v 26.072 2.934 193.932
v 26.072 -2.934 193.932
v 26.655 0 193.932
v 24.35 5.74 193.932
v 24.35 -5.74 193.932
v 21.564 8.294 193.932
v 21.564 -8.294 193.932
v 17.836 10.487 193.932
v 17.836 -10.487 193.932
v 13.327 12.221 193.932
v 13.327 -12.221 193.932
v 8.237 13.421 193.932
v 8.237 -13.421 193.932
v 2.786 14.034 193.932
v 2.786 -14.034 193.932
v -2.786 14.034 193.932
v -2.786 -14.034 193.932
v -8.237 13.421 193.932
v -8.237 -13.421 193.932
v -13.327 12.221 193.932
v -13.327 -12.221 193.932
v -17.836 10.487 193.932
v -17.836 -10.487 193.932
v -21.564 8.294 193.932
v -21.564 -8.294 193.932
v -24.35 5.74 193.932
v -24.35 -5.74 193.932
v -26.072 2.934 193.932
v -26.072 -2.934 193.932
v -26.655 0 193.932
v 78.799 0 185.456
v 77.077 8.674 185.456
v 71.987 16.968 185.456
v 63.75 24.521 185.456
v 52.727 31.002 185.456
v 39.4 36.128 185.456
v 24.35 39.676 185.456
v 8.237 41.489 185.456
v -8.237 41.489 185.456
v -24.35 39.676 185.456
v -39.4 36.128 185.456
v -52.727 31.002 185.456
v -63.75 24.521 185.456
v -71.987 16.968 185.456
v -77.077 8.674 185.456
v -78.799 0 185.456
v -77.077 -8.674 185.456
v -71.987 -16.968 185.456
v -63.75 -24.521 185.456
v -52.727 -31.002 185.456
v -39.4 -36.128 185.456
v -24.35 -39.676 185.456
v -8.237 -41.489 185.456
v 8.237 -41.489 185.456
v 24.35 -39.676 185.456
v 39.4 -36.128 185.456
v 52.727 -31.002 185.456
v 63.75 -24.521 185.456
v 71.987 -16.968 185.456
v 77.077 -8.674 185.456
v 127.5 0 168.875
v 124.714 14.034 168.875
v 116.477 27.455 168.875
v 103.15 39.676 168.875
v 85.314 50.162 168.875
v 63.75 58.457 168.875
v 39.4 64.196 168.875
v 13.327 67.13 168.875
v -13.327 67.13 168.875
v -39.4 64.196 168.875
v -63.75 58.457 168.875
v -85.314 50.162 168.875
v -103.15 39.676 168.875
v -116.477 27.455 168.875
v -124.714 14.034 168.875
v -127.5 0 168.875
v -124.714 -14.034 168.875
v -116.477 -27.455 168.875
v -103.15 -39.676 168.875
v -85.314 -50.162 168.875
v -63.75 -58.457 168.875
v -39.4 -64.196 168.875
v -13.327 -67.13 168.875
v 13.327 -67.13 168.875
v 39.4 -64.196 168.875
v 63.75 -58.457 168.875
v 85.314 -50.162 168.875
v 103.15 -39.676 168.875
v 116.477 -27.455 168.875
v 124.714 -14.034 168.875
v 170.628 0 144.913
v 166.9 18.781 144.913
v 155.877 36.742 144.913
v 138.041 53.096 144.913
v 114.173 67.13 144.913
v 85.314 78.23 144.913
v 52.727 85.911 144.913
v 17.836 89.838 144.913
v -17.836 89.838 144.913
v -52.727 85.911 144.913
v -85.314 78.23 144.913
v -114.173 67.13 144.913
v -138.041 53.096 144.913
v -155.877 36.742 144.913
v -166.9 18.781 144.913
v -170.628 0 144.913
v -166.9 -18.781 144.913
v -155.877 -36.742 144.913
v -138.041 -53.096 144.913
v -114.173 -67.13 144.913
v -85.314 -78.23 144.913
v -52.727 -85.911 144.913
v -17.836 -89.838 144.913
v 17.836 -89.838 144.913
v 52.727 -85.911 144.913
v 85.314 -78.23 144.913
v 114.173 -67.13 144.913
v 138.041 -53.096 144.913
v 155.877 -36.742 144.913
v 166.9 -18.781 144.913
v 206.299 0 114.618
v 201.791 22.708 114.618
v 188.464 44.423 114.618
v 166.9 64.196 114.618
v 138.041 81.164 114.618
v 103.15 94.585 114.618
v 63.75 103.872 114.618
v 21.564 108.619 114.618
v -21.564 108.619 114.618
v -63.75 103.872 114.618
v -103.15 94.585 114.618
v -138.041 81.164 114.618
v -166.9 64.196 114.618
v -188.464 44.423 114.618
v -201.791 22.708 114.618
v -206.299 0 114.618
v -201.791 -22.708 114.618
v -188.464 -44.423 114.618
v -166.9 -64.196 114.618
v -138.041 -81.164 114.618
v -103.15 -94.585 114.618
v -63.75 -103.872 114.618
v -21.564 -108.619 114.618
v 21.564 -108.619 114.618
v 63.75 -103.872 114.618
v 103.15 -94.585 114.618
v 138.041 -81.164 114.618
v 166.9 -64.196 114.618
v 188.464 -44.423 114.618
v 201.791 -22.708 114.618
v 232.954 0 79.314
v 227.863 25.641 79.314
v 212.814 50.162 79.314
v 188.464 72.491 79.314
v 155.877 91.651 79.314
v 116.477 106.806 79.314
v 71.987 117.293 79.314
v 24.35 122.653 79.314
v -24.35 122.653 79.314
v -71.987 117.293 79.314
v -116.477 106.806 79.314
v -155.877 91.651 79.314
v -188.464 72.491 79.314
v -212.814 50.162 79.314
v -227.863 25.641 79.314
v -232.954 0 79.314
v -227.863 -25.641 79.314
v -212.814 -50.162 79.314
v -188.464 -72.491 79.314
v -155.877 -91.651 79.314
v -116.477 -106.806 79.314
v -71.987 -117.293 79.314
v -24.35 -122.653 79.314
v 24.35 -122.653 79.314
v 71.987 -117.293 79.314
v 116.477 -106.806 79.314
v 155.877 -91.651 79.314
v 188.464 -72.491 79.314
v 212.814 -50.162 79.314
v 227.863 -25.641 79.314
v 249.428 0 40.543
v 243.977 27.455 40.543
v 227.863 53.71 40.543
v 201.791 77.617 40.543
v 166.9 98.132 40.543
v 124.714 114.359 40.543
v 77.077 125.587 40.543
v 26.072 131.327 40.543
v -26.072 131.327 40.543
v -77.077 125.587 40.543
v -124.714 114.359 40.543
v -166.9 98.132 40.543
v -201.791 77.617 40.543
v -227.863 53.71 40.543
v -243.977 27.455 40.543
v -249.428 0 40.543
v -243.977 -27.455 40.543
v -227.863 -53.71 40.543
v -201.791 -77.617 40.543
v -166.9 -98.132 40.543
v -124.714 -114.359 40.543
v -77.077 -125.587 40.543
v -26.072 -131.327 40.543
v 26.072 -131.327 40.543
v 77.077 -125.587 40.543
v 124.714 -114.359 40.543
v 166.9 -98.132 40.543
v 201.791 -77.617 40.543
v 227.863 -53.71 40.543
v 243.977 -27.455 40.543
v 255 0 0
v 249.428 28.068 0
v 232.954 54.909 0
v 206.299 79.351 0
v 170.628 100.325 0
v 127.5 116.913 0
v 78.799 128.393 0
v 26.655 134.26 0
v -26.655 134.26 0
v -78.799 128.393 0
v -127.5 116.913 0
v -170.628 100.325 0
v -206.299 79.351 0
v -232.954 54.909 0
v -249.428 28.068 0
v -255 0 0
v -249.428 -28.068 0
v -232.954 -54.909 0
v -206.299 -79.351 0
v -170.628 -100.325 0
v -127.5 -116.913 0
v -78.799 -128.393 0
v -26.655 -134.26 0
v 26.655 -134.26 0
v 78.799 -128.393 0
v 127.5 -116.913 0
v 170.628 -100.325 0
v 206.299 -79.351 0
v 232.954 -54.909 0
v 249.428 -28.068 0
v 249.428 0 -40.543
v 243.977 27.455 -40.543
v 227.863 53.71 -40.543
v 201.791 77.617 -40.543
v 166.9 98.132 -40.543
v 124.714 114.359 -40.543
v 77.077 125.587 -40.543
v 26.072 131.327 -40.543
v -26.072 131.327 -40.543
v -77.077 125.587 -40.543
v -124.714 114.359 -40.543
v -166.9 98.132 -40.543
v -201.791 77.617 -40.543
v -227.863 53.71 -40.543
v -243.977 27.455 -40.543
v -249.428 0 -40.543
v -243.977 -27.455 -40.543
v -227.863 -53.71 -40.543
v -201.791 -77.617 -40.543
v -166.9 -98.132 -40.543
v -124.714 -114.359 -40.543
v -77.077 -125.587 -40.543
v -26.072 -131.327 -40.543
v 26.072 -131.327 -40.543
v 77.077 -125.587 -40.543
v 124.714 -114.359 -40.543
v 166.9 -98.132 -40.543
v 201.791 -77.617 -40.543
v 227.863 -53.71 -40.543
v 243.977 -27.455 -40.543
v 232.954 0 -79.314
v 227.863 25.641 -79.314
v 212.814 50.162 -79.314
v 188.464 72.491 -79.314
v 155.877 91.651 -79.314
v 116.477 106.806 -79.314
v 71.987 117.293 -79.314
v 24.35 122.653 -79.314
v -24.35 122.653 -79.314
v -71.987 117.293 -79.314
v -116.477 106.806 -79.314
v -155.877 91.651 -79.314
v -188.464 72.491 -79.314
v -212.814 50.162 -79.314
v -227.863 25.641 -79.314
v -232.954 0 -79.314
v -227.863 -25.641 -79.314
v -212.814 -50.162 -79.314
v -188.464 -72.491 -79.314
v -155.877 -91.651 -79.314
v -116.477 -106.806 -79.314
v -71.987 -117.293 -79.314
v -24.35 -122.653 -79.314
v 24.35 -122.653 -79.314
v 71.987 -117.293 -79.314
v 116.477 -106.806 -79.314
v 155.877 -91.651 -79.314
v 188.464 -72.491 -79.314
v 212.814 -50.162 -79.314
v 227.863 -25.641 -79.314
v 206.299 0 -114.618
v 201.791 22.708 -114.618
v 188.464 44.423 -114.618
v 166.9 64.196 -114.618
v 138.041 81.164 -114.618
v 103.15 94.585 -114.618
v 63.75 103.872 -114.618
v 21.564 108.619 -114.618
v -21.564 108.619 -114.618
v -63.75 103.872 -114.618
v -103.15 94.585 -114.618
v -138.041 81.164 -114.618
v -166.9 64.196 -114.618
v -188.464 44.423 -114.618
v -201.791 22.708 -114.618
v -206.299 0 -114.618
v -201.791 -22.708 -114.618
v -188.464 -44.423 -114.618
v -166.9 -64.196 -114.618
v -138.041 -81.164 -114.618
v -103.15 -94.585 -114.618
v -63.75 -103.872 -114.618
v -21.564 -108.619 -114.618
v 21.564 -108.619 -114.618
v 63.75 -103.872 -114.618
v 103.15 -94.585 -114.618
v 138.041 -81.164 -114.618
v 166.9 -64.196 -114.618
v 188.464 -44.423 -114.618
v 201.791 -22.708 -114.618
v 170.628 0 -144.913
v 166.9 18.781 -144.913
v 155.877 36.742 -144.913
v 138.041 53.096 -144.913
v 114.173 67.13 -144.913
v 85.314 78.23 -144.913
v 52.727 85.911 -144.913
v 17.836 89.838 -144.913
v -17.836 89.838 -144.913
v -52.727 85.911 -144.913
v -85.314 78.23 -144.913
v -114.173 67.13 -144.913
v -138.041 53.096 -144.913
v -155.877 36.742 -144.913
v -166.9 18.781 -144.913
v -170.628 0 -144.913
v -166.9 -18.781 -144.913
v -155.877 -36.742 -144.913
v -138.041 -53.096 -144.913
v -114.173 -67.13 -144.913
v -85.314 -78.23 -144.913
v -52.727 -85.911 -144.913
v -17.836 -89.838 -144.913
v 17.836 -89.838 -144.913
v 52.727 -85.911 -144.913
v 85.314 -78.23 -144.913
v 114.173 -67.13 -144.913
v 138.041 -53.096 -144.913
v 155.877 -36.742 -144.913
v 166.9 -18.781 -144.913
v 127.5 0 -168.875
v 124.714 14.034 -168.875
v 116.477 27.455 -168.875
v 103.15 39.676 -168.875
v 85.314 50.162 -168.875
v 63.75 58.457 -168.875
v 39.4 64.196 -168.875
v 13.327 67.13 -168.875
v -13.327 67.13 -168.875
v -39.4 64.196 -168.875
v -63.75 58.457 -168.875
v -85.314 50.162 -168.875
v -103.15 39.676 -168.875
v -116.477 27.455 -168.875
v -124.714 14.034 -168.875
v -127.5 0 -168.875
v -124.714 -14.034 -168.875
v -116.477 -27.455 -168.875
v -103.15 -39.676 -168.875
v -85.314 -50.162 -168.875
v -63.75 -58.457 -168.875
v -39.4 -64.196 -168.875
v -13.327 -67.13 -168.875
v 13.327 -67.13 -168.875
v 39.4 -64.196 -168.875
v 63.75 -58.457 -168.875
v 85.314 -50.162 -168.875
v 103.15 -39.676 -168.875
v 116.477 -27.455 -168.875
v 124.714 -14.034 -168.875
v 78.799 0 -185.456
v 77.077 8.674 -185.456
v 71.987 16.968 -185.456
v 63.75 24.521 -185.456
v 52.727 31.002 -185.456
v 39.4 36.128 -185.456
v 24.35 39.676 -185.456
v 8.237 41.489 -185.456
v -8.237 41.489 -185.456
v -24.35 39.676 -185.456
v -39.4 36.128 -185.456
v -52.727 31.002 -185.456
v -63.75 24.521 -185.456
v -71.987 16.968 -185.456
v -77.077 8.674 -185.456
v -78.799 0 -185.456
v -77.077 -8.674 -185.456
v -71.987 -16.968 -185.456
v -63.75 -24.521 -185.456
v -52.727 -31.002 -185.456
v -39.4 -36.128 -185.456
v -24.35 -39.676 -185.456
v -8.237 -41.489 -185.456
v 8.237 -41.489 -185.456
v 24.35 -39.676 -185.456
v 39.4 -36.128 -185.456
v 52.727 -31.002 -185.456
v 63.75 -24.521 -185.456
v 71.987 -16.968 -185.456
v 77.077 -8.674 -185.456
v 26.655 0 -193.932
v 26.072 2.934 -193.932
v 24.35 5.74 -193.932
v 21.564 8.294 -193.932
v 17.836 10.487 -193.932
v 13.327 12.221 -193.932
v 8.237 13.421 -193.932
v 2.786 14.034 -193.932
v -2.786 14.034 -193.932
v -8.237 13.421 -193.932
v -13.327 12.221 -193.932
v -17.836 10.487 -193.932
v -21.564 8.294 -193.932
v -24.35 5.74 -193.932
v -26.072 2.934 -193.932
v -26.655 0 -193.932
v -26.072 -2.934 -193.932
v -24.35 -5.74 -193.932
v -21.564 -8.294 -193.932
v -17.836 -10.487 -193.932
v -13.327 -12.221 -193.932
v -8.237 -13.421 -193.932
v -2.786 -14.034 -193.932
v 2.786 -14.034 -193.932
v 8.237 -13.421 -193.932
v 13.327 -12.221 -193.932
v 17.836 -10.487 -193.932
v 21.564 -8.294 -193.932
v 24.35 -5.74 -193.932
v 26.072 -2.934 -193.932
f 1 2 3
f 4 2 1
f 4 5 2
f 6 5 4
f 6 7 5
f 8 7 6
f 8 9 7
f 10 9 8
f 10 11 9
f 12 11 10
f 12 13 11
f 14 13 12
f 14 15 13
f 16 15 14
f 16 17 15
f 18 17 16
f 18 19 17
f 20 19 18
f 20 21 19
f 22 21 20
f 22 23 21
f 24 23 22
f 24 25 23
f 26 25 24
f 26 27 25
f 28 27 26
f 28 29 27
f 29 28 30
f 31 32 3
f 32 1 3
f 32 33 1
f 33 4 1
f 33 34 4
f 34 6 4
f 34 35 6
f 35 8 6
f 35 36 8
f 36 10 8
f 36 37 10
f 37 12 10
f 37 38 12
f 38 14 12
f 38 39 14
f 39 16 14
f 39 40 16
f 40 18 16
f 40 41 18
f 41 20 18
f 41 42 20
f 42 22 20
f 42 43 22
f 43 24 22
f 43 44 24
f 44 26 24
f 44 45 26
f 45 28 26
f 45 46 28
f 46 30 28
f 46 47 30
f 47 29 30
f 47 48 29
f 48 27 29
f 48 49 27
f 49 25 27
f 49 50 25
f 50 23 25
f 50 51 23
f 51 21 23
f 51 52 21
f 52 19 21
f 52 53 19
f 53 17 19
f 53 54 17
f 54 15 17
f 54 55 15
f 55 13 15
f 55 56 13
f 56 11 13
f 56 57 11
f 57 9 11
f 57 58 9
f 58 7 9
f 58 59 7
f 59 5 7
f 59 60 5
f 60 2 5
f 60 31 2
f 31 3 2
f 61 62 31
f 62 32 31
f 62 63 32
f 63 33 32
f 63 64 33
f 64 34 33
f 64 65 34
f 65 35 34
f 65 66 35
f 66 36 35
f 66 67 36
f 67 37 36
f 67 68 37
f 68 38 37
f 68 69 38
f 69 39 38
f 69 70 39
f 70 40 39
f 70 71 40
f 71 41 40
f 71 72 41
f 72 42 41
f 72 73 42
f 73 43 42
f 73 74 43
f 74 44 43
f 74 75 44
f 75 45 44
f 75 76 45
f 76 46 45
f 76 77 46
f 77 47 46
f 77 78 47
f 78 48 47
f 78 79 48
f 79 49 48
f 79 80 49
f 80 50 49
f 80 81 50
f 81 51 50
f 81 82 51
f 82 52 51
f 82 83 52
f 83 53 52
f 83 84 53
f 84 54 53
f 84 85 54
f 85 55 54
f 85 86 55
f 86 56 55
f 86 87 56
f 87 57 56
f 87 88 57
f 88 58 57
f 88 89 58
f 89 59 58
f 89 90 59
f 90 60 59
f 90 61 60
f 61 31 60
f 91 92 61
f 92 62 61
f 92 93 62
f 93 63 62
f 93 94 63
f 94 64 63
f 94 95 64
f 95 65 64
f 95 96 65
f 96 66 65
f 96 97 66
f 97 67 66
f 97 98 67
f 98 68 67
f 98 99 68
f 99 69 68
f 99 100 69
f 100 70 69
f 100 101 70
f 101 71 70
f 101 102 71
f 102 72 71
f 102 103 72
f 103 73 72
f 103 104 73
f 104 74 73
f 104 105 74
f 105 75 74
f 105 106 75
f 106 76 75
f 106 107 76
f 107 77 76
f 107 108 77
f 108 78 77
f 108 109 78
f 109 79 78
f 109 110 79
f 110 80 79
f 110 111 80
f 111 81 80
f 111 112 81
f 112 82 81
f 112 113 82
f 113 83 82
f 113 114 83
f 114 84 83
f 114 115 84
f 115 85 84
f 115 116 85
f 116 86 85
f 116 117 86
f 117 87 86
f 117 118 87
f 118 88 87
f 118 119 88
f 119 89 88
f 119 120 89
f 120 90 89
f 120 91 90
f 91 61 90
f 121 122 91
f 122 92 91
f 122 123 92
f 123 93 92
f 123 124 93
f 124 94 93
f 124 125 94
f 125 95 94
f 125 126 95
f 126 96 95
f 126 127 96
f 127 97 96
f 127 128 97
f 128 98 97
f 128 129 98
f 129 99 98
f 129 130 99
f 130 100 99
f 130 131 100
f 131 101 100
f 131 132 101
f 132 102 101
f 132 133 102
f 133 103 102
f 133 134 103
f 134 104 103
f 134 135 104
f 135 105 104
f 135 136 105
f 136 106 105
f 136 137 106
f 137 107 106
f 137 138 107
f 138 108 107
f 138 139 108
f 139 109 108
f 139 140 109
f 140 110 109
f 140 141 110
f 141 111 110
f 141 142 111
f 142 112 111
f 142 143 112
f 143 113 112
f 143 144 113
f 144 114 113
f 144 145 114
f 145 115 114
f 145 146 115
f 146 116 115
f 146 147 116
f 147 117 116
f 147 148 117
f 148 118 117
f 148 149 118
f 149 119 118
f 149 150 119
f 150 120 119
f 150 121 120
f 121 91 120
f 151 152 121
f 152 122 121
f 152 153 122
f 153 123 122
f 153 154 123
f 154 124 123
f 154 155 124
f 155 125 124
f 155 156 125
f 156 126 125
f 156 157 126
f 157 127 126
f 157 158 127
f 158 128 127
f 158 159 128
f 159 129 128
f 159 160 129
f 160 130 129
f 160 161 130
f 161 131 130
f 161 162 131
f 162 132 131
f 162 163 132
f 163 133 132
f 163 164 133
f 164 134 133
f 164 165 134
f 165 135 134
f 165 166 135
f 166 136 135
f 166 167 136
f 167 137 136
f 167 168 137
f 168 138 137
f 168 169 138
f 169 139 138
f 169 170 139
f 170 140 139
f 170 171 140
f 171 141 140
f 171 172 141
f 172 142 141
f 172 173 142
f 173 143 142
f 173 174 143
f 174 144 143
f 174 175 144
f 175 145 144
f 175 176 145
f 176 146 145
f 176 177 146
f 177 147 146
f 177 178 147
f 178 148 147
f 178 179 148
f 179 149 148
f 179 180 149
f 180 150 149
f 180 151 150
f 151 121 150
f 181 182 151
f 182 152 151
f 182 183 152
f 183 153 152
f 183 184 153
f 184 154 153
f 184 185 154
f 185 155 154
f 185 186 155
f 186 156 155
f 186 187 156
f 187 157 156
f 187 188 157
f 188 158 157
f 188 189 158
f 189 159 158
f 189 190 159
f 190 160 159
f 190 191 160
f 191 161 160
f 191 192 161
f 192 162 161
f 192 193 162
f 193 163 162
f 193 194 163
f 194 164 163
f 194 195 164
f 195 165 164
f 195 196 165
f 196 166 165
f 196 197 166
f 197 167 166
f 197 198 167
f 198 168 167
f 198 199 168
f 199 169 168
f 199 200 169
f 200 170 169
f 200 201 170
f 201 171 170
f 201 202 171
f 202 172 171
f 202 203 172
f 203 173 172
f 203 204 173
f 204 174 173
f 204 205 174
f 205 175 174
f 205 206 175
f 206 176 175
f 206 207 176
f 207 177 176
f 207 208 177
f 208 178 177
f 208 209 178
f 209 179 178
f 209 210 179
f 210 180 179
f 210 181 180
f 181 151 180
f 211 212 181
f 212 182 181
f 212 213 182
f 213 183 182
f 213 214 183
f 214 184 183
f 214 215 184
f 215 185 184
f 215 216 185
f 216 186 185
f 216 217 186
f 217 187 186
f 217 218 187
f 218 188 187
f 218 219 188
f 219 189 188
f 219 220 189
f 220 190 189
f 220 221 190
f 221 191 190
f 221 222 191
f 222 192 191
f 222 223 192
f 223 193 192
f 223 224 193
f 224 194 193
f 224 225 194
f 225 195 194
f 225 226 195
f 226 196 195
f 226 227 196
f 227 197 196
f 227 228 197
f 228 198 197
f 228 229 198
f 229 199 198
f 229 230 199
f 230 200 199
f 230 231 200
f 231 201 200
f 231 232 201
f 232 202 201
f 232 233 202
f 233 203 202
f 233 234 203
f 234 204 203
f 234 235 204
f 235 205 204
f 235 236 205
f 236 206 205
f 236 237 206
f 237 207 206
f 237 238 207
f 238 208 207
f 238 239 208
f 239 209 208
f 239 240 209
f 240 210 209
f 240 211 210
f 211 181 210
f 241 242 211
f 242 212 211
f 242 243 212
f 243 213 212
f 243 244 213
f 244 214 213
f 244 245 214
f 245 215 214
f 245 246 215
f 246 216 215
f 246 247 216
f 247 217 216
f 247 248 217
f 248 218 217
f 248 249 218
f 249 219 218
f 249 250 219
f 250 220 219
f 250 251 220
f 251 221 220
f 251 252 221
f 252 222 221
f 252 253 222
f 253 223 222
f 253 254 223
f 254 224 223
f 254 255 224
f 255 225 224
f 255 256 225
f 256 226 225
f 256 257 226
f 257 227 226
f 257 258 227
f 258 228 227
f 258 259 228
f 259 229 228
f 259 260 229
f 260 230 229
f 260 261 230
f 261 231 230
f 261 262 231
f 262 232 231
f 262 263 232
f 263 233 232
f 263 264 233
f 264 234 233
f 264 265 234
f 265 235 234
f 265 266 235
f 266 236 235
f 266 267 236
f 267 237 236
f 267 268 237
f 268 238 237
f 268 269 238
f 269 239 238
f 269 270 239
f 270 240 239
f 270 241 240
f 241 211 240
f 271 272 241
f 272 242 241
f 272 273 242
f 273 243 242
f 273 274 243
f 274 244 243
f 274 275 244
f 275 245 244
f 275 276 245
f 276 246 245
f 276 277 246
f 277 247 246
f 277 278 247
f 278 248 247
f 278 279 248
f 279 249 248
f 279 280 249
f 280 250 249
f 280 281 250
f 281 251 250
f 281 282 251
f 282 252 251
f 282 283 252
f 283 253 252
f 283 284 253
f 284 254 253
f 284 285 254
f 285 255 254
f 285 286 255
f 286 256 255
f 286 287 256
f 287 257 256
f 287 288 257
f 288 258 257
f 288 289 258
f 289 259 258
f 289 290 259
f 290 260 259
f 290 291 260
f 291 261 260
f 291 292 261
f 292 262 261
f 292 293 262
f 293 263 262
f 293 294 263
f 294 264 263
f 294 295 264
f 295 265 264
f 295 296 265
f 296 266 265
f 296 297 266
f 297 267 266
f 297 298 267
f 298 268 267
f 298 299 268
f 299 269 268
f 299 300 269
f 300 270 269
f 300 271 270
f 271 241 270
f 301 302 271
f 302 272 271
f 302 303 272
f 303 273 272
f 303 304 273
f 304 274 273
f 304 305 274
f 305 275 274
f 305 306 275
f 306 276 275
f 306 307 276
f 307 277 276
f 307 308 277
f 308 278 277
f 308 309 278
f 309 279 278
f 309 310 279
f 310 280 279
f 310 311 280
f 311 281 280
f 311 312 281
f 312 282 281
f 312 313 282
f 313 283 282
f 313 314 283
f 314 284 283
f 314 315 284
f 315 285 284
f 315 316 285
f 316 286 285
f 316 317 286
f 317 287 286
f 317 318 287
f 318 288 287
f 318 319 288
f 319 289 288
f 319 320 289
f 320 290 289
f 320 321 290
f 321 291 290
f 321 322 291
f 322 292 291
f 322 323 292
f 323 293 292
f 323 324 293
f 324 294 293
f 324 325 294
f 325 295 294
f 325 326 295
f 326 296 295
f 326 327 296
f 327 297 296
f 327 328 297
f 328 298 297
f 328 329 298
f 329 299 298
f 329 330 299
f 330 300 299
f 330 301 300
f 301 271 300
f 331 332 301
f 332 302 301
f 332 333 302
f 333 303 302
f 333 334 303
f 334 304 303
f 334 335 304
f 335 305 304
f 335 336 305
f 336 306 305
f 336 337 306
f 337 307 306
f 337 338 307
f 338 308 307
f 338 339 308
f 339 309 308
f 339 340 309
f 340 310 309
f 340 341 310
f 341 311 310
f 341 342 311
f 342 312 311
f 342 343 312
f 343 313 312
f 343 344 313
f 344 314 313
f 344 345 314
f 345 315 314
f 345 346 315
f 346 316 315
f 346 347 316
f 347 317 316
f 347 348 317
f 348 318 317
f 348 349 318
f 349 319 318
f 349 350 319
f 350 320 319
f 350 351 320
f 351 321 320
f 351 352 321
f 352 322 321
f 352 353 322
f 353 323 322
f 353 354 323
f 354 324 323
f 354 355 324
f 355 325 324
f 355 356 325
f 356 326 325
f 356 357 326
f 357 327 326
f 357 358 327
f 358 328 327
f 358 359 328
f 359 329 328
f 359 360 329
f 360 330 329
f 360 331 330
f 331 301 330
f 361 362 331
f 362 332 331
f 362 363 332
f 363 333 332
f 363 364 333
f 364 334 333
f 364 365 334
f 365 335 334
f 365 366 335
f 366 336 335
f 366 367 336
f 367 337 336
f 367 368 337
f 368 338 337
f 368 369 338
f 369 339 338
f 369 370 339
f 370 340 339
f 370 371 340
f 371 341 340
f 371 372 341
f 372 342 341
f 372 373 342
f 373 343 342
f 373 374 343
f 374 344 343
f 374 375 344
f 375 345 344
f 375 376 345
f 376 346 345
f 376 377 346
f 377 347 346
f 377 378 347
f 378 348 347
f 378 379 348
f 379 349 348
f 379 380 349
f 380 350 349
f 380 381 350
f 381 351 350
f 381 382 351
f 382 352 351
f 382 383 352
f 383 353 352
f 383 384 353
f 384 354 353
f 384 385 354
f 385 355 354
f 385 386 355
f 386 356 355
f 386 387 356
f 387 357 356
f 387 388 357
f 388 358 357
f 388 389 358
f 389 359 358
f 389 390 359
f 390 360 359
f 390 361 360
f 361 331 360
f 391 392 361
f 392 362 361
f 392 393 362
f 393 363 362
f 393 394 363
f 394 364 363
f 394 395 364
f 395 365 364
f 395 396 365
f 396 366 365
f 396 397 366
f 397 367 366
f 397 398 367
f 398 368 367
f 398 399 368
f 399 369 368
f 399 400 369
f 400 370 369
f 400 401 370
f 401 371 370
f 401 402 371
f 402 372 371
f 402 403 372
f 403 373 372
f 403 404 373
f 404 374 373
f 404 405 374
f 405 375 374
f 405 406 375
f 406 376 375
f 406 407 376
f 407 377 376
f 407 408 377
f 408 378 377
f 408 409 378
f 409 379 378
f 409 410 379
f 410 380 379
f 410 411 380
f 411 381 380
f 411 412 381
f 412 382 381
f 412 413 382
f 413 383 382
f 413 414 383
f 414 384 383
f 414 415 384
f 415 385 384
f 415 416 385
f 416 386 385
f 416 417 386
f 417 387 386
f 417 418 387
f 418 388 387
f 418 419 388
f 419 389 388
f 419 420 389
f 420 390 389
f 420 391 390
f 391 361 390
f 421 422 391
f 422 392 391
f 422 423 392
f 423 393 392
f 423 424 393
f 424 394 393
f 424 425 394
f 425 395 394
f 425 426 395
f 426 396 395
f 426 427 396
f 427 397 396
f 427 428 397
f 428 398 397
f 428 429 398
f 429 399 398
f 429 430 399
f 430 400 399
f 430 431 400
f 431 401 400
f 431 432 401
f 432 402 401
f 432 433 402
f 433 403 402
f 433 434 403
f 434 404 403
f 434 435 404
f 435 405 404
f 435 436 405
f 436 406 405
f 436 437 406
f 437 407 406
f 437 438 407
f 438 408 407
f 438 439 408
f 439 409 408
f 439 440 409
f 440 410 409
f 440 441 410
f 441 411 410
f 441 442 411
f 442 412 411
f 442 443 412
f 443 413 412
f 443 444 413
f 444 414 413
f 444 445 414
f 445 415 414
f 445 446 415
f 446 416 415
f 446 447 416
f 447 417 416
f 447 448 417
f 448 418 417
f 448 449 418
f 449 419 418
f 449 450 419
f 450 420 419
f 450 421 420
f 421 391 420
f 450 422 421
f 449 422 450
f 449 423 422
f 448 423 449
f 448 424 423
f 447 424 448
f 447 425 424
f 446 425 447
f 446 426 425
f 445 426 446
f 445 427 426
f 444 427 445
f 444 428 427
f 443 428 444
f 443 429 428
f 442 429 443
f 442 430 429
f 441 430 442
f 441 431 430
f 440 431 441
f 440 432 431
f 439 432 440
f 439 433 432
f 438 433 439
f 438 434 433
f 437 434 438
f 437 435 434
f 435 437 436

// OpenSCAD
// Generated by SolidPython 1.0.1 on 2020-07-29 00:46:53


scale(v = [17, 9, 13]) {
	sphere(r = 15);
}
/***********************************************
*********      SolidPython code:      **********
************************************************
 
# import packages: SolidPython
from solid import *
from solid.utils import *
from itertools import chain, combinations, permutations


class Resize:

    def __init__(self, scad_file):
        self.scad_file = scad_file
        #self.scad_file = import_scad(scad_file)
        # cone/cylinder param:
        self.r1 = 0
        self.r2 = 0
        self.h = 0
        # rectangular prism param:
        self.w = 0
        self.l = 0
        # ellipse param:
        self.r = 0

    # import OpenScad code (file name corresponds to shape)


    # classify shape + parameters
    def assign(self, param1, param2, param3):
        if self.scad_file == 'cone.scad':
            self.r1 = param1
            self.r2 = param2
            self.h = param3
        elif self.scad_file == 'cylinder.scad':
            self.r1 = param1
            self.r2 = param2
            self.h = param3
        elif self.scad_file == 'rectangularPrism.scad':
            self.h = param1
            self.l = param2
            self.w = param3
        else:
            self.r = param1
            self.h = param2

    # resize parameters
    def iterate(self):
        x = range(3, 20, 2)
        i = 1
        if self.scad_file == 'cone.scad':
            tempList = list(permutations(x, 2))
            for temp in tempList:
                param1 = temp[0]
                param2 = temp[1]
                filepath = 'produced_scad_files/' + 'cone' + str(param1) + '_' + str(param2) + '_' + '.scad'
                scad_render_to_file(cylinder(h=param1, r1=param2, r2=0), filepath)

        elif self.scad_file == 'cylinder.scad':
            tempList = list(permutations(x, 3))
            for temp in tempList:
                param1 = temp[0]
                param2 = temp[1]
                filepath = 'produced_scad_files/' + 'cylinder' + str(param1) + '_' + str(param2) + '_' + '.scad'
                scad_render_to_file(cylinder(h=param1, r1=param2, r2=param2), filepath)

        elif self.scad_file == 'rectangularPrism.scad':
            tempList = list(permutations(x, 3))
            for temp in tempList:
                param1 = temp[0]
                param2 = temp[1]
                param3 = temp[2]
                filepath = 'produced_scad_files/' + 'rectangularPrism' + str(param1) + '_' + str(param2) + '_' + str(
                    param3) + '.scad'
                scad_render_to_file(cube(size=(param1, param2, param3)), filepath)

        elif self.scad_file == 'ellipse.scad':
            tempList = list(permutations(x, 4))
            for temp in tempList:
                param1 = temp[0]
                param2 = temp[1]
                param3 = temp[2]
                param4 = temp[3]
                filepath = 'produced_scad_files/' + 'ellipse' + str(param1) + '_' + str(param2) + '_' + str(param3) + '_' + str(param4) + '.scad'
                scad_render_to_file(scale([param1, param2, param3])(sphere(r=param4)), filepath)

    def render_to_scadfile(self):
        scad_render_to_file(scad, 'example.scad') 
 
************************************************/
